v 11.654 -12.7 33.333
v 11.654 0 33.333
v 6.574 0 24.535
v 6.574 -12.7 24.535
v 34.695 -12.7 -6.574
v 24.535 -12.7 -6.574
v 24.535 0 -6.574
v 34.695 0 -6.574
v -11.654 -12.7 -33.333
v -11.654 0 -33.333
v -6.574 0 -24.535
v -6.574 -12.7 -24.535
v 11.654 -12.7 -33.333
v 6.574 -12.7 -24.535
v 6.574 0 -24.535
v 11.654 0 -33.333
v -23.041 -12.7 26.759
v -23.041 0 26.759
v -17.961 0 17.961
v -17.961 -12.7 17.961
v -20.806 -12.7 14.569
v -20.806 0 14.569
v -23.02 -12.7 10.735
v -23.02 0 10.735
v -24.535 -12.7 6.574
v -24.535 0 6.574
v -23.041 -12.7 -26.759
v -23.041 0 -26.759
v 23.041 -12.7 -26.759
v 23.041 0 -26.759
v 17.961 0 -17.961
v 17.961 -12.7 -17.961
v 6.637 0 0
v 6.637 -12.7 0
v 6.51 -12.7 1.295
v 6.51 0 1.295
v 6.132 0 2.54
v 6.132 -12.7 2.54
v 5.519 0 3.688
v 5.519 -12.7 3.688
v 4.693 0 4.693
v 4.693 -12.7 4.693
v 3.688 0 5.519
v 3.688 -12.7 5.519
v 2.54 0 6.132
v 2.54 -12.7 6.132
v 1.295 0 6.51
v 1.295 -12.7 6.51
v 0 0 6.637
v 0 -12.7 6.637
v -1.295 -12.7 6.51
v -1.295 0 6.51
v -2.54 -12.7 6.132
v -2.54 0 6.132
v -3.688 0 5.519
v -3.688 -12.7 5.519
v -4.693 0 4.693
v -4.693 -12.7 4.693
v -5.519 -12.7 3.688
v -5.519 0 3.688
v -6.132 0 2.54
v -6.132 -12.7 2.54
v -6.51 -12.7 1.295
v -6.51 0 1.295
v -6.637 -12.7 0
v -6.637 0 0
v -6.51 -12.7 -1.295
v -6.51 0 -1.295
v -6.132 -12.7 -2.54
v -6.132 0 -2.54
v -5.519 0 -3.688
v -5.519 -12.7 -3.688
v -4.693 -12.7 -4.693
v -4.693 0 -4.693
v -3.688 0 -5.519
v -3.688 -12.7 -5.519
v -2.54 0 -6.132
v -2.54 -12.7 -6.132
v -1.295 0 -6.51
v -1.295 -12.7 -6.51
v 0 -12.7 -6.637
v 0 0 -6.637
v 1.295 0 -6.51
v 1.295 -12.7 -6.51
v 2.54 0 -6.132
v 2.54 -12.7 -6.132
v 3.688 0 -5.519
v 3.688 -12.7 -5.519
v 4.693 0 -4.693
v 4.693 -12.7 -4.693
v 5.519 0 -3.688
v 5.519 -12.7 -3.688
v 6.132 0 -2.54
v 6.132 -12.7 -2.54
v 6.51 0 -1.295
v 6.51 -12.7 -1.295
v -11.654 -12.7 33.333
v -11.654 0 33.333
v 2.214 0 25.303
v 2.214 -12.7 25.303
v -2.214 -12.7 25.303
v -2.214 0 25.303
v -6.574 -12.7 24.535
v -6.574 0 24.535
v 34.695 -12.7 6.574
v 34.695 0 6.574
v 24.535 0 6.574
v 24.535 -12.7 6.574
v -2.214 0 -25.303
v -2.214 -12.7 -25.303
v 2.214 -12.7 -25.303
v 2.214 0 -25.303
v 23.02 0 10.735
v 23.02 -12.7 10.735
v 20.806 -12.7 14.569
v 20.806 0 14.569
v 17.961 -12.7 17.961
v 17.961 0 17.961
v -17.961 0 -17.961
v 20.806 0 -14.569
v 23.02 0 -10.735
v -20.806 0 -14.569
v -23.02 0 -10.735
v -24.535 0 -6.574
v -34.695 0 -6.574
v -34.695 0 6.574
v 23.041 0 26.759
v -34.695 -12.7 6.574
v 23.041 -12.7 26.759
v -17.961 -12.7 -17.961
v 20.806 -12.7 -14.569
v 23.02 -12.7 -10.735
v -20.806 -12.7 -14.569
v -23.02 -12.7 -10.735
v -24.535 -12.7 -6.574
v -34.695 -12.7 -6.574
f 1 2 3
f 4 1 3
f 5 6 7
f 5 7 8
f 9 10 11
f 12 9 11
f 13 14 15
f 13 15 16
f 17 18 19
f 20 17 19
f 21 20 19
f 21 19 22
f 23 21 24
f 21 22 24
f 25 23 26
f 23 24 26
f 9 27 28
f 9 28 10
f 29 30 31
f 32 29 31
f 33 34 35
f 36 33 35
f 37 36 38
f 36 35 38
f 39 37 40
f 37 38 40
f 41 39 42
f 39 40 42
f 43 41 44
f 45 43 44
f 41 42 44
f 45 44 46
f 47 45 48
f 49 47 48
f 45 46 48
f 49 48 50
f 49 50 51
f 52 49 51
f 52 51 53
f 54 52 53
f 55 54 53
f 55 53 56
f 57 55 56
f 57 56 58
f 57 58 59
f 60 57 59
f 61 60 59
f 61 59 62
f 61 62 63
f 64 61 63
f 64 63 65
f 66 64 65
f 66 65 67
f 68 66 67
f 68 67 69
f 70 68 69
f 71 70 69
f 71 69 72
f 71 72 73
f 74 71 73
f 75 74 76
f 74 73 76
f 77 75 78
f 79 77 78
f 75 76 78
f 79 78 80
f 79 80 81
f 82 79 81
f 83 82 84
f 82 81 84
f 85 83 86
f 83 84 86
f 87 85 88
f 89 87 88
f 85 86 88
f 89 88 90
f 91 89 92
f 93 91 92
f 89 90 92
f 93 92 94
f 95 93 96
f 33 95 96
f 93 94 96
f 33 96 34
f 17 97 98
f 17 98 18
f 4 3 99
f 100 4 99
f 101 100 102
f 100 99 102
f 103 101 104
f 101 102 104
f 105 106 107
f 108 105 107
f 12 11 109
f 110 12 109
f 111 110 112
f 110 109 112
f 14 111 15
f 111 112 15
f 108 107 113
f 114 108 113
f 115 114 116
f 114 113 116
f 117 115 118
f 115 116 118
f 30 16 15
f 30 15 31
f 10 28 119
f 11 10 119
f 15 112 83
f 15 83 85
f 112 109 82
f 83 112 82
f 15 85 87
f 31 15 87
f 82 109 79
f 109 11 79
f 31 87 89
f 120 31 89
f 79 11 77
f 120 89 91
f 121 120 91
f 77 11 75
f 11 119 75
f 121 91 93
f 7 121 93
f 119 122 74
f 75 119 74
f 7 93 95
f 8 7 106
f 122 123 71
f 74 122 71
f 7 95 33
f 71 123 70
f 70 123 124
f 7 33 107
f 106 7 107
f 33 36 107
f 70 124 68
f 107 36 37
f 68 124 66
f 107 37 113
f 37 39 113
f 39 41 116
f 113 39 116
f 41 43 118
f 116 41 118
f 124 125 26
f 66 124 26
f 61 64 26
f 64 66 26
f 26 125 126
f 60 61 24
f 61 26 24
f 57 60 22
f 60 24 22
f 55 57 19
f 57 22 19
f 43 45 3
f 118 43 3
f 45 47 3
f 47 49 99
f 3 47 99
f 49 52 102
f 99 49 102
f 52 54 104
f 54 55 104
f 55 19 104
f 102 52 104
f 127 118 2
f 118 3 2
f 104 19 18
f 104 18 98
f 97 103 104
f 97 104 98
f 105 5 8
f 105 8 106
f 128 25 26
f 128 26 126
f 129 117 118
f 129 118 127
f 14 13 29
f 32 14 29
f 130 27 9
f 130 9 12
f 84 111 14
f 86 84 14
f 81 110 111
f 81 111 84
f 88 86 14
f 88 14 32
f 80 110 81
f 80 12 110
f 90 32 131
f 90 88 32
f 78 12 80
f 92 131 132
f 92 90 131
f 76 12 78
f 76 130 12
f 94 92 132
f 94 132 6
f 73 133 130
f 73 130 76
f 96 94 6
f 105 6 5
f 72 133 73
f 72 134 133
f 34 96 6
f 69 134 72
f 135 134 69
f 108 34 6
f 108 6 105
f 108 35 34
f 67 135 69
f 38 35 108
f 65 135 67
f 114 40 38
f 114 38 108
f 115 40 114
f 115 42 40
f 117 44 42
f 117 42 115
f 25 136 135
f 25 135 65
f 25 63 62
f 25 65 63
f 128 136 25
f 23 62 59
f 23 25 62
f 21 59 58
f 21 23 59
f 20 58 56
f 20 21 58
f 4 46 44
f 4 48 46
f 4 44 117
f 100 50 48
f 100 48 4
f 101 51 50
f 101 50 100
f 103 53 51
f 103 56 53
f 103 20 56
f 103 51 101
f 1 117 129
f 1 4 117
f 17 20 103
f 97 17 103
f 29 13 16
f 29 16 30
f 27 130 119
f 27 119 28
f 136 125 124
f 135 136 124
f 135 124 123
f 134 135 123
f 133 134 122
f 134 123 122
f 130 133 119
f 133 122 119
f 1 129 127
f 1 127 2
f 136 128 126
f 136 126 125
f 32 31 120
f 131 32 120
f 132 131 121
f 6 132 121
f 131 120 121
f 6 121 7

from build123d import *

# Parameters (mm, degrees)
F0_R     = 25.4
F1_DEPTH = 12.7
F3_DEPTH = 12.7
F5_COUNT = 6
F6_R     = 6.637445
F7_DEPTH = 12.701


with BuildPart() as f1:
    # F0 (on Front) → F1 (new body)
    with BuildSketch(Plane.XZ):
        Circle(F0_R)
    extrude(amount=F1_DEPTH)

    # F2 (on face) → F3 (join)
    with BuildSketch(Plane.XZ.offset(12.7)):
        Polygon((24.534516, 0), (0, 0), (24.534516, -6.574004), align=None)
        Polygon((24.534516, 6.574004), (0, 0), (24.534516, 0), align=None)
        with BuildLine():
            Line((24.534516, 6.574004), (24.534516, 0))
            Line((24.534516, 0), (25.4, 0))
            ThreePointArc((25.4, 0), (25.182699, 3.315365), (24.534516, 6.574004))
        make_face()
        with BuildLine():
            Line((25.4, 0), (24.534516, 0))
            Line((24.534516, 0), (24.534516, -6.574004))
            ThreePointArc((24.534516, -6.574004), (25.182699, -3.315365), (25.4, 0))
        make_face()
        with BuildLine():
            ThreePointArc((25.4, 0), (25.182699, -3.315365), (24.534516, -6.574004))
            Line((24.534516, -6.574004), (34.694516, -6.574004))
            Line((34.694516, -6.574004), (34.694516, 6.574004))
            Line((34.694516, 6.574004), (24.534516, 6.574004))
            ThreePointArc((24.534516, 6.574004), (25.182699, 3.315365), (25.4, 0))
        make_face()
    extrude(amount=-F3_DEPTH)

    # F5: F1 ×6 about axis
    f5_axis = Axis((0, 32.601867, 0), (0, 1, 0))


with BuildPart() as f1_1:
    add(f1.part)
    for i in range(1, F5_COUNT):
        add(f1.part.rotate(f5_axis, i * 360 / F5_COUNT))

    # F6 (on face) → F7 (cut, through all)
    with BuildSketch(Plane.XZ.offset(12.7)):
        Circle(F6_R)
    extrude(amount=-F7_DEPTH, mode=Mode.SUBTRACT)


solid = f1_1.part
